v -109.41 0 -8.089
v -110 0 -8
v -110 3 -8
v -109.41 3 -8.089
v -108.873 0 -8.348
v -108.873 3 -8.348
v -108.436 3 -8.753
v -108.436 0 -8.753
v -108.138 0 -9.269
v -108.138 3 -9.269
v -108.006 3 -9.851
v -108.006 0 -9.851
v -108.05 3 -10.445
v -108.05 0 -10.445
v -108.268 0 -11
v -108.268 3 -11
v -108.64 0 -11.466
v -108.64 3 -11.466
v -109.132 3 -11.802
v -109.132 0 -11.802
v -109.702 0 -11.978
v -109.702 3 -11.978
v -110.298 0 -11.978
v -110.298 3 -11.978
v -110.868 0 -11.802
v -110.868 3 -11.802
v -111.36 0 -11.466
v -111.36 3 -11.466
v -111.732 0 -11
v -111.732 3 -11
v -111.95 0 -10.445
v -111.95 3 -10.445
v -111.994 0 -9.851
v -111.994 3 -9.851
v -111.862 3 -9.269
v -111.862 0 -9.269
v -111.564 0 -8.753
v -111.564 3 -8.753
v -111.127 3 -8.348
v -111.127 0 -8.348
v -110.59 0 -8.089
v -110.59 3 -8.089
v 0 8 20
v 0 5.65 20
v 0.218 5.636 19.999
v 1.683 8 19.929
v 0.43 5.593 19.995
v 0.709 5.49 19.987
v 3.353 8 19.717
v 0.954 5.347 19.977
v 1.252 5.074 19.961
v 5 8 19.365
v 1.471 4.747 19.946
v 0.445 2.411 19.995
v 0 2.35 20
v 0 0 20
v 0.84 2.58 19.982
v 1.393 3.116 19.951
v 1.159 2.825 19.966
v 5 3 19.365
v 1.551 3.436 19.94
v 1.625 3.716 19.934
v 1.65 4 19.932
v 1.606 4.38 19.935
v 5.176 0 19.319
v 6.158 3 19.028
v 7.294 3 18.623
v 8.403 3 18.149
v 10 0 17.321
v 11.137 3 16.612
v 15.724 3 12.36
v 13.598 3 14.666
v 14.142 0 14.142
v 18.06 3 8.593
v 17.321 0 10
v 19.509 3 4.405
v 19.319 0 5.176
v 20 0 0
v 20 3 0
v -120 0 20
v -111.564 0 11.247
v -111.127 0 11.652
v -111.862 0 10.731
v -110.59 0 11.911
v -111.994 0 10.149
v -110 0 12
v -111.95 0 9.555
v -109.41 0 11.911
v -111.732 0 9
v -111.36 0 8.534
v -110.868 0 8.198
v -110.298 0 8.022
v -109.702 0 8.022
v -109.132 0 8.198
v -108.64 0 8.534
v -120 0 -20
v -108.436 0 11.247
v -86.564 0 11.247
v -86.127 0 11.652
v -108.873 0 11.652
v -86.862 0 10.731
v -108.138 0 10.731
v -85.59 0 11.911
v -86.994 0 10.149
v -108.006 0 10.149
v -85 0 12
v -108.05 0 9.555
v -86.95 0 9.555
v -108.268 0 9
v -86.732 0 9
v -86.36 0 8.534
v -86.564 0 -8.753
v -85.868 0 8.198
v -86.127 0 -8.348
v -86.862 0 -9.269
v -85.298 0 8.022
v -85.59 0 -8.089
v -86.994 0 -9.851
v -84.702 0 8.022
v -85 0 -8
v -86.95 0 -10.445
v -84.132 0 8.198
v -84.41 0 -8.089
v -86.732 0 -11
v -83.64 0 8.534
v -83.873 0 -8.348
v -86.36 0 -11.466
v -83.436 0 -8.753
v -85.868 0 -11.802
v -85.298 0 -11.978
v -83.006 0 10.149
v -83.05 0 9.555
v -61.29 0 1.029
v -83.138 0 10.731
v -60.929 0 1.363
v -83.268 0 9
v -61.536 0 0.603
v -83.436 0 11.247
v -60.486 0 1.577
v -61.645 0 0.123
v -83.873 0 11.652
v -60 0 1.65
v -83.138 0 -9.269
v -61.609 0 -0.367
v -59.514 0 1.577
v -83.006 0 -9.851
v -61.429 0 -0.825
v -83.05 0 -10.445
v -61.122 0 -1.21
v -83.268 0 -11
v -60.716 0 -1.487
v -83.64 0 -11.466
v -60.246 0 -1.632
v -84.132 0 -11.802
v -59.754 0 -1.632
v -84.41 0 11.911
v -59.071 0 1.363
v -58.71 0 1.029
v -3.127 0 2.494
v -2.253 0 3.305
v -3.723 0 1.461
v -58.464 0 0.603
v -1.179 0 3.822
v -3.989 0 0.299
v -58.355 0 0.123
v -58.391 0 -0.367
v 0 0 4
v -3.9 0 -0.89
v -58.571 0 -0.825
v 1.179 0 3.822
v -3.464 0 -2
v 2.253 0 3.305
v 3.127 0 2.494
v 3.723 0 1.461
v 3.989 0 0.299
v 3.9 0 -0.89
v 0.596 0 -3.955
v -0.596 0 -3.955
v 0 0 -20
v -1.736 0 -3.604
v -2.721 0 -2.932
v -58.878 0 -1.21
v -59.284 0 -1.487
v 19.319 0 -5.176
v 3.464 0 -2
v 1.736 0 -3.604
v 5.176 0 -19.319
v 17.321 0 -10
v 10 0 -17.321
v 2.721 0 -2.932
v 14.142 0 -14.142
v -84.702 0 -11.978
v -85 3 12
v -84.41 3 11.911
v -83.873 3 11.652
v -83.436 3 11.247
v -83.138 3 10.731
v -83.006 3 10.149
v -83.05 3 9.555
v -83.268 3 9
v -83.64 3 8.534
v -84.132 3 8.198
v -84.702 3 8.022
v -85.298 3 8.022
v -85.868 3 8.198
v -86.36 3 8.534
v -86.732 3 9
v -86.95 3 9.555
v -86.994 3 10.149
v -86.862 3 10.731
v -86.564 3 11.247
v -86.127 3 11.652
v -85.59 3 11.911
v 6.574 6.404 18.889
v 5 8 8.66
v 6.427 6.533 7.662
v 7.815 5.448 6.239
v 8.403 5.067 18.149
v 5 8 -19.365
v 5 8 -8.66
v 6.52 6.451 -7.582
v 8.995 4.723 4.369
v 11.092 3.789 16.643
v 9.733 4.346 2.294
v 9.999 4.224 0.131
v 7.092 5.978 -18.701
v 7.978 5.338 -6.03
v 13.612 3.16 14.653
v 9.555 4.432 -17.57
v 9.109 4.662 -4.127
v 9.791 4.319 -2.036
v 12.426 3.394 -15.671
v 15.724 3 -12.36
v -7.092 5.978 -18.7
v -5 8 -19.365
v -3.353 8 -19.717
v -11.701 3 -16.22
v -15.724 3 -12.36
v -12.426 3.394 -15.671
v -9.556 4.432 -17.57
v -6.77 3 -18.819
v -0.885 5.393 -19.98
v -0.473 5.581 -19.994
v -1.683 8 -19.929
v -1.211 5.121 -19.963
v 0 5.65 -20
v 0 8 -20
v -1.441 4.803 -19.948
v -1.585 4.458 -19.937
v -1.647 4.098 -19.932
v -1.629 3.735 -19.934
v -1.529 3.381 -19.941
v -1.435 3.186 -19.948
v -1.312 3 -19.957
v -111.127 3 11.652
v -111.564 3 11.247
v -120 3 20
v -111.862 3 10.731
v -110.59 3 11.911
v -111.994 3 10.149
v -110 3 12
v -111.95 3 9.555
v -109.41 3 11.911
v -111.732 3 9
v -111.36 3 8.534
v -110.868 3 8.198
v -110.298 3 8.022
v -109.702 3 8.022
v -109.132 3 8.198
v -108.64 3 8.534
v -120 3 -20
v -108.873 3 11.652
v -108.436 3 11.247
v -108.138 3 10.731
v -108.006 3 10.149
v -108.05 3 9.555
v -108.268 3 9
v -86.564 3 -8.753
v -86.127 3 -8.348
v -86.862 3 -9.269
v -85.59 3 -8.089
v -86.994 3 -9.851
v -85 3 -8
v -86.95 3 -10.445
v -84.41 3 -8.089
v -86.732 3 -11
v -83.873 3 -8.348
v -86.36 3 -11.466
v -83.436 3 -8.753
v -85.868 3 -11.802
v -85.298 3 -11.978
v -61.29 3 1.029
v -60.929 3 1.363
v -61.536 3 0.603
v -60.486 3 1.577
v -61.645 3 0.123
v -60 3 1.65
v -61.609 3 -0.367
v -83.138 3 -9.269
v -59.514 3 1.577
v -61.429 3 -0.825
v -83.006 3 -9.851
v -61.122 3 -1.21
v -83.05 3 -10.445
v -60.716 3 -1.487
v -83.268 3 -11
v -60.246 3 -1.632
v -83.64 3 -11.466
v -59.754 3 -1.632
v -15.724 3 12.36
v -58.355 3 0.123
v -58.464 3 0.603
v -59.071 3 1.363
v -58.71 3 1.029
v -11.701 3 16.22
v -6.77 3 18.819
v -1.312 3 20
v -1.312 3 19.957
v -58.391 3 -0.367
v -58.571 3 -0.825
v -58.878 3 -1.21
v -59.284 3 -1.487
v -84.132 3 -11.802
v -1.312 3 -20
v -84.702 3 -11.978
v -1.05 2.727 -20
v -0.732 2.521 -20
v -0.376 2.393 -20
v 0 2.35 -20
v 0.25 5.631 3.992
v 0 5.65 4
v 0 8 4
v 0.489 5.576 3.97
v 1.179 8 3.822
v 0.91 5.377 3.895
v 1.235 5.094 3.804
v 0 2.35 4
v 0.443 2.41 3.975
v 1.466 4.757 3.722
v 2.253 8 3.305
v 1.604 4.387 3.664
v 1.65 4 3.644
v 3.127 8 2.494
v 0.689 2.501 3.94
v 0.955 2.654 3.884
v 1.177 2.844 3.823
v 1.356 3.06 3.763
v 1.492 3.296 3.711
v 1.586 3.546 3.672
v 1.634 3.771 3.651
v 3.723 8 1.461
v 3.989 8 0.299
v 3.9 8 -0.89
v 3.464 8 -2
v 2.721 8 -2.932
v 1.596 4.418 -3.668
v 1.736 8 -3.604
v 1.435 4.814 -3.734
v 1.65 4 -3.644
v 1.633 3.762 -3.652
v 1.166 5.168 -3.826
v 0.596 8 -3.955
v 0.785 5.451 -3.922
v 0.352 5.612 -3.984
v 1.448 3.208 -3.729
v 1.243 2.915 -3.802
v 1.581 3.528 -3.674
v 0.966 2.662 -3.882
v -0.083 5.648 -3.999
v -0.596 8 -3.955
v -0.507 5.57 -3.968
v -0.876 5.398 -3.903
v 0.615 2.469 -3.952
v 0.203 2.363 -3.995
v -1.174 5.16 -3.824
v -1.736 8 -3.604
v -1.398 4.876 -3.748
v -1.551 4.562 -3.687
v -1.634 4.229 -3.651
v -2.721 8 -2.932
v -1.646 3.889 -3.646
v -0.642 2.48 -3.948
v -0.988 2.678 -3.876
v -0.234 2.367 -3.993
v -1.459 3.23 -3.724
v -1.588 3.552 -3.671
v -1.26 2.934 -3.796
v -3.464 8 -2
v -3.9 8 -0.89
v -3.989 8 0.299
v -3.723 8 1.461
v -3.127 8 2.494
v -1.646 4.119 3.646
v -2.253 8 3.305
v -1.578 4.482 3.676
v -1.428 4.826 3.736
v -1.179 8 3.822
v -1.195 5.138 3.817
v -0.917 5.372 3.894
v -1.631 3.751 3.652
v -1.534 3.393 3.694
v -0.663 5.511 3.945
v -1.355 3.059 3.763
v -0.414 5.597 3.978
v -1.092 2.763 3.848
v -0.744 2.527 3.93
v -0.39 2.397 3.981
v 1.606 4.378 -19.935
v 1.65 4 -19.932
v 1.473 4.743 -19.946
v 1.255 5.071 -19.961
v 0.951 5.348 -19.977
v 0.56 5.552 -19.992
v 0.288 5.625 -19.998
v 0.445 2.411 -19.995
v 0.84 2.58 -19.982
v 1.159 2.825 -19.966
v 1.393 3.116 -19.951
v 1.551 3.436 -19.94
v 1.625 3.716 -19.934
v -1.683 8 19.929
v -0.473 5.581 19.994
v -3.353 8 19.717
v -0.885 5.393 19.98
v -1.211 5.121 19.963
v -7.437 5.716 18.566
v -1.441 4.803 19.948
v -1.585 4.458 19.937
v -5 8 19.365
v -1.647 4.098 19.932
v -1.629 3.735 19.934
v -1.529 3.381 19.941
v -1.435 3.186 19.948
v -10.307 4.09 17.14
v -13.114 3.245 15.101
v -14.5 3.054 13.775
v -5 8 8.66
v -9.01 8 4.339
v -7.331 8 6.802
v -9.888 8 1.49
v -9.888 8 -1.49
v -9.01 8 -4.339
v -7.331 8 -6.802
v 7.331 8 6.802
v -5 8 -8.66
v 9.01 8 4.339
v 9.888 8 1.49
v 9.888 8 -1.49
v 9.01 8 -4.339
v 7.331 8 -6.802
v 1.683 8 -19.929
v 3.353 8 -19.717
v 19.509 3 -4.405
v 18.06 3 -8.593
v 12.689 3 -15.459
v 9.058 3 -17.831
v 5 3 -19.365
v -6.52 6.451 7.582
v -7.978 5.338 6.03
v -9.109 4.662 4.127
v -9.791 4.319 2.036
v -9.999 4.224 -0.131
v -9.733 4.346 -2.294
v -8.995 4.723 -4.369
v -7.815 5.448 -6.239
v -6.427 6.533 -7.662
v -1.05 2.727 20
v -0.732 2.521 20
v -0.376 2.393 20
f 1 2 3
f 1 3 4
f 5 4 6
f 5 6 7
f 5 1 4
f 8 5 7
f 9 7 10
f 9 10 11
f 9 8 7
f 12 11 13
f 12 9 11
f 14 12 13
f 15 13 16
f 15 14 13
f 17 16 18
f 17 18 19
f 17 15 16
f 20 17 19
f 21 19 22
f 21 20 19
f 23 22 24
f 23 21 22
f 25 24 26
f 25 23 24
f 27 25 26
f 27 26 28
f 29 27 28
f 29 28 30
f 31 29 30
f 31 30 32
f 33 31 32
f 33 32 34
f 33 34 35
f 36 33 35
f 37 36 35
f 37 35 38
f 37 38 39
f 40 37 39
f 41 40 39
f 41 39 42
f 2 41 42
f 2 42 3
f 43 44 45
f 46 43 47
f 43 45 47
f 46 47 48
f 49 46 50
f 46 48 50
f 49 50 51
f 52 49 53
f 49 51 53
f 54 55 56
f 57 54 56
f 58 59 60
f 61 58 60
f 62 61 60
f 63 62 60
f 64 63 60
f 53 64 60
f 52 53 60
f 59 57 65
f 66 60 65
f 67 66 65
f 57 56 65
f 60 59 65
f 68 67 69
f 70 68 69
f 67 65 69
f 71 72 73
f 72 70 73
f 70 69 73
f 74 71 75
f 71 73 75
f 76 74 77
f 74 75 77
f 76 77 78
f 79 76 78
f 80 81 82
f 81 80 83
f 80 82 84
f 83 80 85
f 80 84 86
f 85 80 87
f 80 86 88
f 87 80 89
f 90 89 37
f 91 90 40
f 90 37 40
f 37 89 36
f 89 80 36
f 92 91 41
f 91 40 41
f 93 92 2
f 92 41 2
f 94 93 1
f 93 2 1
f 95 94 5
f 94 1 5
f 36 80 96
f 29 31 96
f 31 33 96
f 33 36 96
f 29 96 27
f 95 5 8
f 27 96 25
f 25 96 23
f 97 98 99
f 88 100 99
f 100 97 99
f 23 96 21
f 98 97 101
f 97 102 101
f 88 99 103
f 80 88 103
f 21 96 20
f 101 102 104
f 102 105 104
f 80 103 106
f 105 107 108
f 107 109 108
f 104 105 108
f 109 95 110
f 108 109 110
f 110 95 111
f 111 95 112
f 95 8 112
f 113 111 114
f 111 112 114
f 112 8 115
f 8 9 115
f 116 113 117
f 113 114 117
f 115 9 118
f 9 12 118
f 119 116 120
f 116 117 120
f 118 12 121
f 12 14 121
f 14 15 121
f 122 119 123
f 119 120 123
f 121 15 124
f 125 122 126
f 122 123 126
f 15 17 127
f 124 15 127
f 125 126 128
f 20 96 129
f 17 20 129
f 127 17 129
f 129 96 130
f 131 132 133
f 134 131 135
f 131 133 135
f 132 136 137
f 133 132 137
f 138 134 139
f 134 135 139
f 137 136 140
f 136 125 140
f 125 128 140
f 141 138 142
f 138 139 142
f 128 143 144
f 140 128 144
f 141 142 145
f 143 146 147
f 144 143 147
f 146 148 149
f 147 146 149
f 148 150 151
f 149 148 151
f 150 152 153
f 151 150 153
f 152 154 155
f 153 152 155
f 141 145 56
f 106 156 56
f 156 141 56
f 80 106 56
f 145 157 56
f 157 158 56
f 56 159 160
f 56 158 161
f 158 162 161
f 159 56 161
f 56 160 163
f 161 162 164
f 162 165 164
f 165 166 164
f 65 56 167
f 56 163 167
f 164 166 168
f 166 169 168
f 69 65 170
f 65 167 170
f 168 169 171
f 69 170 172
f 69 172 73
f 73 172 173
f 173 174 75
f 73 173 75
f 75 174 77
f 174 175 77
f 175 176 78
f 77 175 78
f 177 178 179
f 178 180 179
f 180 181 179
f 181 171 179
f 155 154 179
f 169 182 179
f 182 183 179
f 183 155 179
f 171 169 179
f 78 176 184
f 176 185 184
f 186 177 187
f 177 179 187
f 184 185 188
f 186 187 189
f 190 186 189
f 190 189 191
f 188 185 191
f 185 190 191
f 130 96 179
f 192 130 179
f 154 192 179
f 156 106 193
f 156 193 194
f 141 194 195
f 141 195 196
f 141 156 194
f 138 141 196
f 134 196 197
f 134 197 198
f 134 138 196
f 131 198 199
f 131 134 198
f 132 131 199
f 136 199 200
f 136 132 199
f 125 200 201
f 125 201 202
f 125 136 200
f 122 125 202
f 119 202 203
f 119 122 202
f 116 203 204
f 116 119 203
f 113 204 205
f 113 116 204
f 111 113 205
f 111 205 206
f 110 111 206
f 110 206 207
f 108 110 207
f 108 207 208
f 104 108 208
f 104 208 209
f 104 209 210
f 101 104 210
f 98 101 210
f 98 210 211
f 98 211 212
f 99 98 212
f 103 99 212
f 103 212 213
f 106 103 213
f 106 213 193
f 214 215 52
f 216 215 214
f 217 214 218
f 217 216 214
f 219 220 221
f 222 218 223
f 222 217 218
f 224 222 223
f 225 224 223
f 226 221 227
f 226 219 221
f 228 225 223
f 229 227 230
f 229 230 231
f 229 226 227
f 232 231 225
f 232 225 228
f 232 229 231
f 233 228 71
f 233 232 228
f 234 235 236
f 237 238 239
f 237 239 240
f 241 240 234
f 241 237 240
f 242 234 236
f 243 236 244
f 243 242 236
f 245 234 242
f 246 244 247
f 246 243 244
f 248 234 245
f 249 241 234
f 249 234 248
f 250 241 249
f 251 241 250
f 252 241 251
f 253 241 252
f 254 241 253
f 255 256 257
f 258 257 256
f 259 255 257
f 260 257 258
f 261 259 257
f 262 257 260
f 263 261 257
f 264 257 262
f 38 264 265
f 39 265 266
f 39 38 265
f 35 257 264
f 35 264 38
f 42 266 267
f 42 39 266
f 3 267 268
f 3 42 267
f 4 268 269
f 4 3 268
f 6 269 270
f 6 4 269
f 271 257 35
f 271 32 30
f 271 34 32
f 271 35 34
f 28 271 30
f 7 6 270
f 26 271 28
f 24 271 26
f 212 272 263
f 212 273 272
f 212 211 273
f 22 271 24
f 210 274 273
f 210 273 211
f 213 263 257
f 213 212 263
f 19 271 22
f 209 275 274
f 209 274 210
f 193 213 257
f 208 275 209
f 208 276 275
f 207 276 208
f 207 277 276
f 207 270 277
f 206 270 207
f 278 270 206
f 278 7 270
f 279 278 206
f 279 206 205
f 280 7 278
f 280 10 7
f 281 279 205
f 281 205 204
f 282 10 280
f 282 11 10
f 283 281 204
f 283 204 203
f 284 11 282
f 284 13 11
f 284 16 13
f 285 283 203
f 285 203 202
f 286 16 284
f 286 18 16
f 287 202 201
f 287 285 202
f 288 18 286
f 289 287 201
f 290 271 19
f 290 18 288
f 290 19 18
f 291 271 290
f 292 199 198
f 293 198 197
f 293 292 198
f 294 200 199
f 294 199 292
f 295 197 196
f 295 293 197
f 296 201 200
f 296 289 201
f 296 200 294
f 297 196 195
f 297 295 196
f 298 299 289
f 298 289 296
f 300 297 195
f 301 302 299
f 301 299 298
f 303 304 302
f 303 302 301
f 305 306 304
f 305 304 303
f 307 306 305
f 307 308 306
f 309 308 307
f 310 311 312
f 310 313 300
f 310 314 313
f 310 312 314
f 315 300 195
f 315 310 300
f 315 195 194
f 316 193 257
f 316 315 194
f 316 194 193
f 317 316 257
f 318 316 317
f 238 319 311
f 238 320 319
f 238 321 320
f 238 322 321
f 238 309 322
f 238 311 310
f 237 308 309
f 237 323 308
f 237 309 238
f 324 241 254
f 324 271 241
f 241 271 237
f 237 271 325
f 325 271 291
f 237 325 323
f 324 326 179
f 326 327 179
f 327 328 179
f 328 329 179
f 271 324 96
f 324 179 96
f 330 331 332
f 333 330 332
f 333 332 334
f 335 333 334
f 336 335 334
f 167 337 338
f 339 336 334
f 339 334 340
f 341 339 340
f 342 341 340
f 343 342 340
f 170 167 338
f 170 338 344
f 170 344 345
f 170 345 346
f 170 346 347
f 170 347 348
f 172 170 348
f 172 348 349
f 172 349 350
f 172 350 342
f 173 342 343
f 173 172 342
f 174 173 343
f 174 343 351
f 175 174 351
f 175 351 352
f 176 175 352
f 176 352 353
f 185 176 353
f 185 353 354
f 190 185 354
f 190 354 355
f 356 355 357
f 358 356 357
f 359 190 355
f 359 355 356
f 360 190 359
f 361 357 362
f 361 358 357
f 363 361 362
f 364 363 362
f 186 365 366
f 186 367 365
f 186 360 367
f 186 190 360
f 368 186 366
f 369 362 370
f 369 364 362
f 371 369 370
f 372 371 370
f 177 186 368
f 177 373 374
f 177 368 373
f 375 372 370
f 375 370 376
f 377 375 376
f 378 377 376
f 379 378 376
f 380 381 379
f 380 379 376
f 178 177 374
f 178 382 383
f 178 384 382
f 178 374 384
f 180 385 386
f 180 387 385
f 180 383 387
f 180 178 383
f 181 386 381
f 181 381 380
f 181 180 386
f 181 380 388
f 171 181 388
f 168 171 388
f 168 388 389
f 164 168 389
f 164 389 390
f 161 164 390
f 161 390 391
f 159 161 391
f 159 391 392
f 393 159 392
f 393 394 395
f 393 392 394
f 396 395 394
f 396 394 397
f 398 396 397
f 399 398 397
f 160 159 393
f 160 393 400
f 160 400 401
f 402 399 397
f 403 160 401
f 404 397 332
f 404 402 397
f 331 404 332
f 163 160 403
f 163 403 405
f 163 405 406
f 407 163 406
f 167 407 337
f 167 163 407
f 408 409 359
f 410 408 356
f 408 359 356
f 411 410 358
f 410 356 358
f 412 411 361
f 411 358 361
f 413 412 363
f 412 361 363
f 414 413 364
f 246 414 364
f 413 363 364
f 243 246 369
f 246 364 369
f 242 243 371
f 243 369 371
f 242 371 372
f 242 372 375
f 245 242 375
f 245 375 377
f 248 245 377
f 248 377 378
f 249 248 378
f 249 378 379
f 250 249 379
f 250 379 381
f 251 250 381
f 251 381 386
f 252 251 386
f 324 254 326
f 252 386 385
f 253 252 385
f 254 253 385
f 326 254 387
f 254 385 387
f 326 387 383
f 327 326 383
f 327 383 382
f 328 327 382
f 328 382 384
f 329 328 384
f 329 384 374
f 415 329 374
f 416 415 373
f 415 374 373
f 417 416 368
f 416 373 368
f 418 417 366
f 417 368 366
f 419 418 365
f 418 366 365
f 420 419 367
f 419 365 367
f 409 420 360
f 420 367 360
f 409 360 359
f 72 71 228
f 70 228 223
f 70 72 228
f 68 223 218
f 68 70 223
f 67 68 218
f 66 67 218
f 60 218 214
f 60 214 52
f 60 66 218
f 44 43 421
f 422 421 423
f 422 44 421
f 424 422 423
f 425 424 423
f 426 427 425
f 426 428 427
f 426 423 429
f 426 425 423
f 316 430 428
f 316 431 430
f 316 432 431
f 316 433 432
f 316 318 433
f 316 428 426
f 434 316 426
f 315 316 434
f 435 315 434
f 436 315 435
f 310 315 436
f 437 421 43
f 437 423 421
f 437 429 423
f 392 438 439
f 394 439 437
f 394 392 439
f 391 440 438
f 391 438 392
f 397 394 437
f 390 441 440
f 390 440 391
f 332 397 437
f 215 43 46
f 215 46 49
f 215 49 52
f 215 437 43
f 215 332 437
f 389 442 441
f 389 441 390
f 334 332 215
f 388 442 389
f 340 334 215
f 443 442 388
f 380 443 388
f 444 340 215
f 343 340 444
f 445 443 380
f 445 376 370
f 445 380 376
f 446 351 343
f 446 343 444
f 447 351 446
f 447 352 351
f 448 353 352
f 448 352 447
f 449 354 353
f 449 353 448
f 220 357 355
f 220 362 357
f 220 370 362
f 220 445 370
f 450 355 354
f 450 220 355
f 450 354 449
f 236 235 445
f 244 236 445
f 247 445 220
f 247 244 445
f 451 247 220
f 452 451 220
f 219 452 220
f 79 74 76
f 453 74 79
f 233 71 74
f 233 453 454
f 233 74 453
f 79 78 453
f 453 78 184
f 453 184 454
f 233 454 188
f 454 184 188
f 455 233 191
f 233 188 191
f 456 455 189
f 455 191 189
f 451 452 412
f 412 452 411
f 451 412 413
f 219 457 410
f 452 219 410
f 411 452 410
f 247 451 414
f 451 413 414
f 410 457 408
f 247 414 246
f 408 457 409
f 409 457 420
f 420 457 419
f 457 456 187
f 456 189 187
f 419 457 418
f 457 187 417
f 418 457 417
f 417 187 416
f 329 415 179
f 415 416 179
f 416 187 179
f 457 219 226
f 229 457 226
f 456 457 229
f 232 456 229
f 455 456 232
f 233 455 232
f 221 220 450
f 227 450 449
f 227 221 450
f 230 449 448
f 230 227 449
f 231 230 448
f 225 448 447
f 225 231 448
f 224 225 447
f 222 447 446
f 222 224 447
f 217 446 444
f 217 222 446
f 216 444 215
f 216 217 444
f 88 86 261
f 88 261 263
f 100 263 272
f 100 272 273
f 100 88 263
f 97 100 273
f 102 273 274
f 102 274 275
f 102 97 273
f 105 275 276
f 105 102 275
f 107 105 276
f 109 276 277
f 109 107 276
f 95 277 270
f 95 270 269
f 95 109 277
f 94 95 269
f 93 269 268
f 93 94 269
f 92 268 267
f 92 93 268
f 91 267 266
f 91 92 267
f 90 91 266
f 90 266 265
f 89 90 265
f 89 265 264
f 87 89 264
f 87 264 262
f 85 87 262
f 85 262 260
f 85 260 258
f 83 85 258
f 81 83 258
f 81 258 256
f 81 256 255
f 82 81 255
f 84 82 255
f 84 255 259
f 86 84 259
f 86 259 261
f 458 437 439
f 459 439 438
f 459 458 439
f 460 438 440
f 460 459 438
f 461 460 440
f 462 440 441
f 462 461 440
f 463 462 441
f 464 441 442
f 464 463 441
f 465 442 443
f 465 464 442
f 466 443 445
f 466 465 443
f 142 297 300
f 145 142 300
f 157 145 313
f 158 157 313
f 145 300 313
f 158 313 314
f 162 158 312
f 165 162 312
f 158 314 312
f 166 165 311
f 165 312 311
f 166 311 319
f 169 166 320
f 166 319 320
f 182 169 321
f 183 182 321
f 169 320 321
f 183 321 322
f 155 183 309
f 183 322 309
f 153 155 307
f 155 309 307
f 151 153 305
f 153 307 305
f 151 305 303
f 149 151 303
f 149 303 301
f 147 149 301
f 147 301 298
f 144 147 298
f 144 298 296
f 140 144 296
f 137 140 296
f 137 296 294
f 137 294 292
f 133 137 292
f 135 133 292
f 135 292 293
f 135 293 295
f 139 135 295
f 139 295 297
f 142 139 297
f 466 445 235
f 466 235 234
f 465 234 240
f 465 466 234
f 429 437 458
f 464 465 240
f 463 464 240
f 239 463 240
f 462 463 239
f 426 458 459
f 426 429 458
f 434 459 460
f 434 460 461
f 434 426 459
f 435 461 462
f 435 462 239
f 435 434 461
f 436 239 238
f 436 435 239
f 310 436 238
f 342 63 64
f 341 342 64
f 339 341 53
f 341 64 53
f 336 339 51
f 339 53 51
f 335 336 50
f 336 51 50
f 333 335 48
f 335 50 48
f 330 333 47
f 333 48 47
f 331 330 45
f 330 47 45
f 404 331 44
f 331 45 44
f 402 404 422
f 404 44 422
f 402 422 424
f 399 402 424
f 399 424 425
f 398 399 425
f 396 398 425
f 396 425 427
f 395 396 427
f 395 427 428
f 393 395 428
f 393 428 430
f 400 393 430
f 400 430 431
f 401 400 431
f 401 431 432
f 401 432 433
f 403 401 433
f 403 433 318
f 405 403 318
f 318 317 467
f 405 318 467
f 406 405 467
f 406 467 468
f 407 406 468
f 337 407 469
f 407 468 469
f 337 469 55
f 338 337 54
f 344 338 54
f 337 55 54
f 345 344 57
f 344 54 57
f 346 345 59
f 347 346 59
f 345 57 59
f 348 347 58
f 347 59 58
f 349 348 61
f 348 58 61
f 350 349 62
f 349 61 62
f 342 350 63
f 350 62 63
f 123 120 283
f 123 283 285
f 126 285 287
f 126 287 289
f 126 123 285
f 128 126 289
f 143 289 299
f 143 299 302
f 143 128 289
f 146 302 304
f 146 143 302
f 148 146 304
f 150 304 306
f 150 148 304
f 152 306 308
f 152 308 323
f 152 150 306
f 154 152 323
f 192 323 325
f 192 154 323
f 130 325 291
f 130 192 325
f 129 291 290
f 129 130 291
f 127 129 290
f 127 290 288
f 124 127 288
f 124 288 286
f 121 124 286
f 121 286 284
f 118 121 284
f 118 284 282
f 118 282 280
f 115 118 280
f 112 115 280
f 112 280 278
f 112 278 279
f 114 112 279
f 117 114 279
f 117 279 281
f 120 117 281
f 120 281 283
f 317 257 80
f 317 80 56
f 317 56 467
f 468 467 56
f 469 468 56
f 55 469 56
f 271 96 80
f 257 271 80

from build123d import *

# Parameters (mm, degrees)
SKETCH1_R           = 2
SKETCH1_R_2         = 4
BOSS_EXTRUDE1_DEPTH = 8
CUT_EXTRUDE1_START  = -5
SKETCH4_R           = 2
CUT_EXTRUDE1_DEPTH  = 5
FILLET2_R           = 14
M4_TAPPED_HOLE1_D   = 3.3
SKETCH5_R           = 1.65
CUT_EXTRUDE2_DEPTH  = 122.757956639
CUT_EXTRUDE3_START  = -5
CUT_EXTRUDE3_DEPTH  = 5


with BuildPart() as part:
    # Sketch1 → Boss-Extrude1 (new body)
    with BuildSketch(Plane(origin=(0, 0, 0), x_dir=(1, 0, 0), z_dir=(0, 1, 0))):
        with BuildLine():
            Line((0, 20), (-120, 20))
            Line((-120, 20), (-120, -5))
            Line((-120, -5), (-120, -20))
            Line((-120, -20), (0, -20))
            ThreePointArc((0, -20), (14.142135607, -14.14213564), (20, -4.7e-08))
            ThreePointArc((20, -4.7e-08), (14.14213564, 14.142135607), (0, 20))
        make_face()
        with Locations(Location((-110, -10, 0), (0, 0, 270))):
            Circle(SKETCH1_R, mode=Mode.SUBTRACT)
        with Locations(Location((-85, -10, 0), (0, 0, 270))):
            Circle(SKETCH1_R, mode=Mode.SUBTRACT)
        with Locations(Location((-110, 10, 0), (0, 0, 270))):
            Circle(SKETCH1_R, mode=Mode.SUBTRACT)
        with Locations(Location((-85, 10, 0), (0, 0, 270))):
            Circle(SKETCH1_R, mode=Mode.SUBTRACT)
        with Locations(Location((0, 0, 0), (0, 0, 270))):
            Circle(SKETCH1_R_2, mode=Mode.SUBTRACT)
    extrude(amount=BOSS_EXTRUDE1_DEPTH)

    # Sketch4 → Cut-Extrude1 (cut)
    # profile 1 of 2: a face of its own
    with BuildSketch(Plane(origin=(0, 8, 0), x_dir=(1, 0, 0), z_dir=(0, 1, 0)).offset(CUT_EXTRUDE1_START)):
        with BuildLine():
            Line((-5, 8.660254038), (-5, 20))
            Line((-5, 20), (-120, 20))
            Line((-120, 20), (-120, -20))
            Line((-120, -20), (-5, -20))
            Line((-5, -20), (-5, -8.660254038))
            ThreePointArc((-5, -8.660254038), (-10, 0), (-5, 8.660254038))
        make_face()
        with Locations(Location((-110, -10, 0), (0, 0, 270))):
            Circle(SKETCH4_R, mode=Mode.SUBTRACT)
        with Locations(Location((-85, -10, 0), (0, 0, 270))):
            Circle(SKETCH4_R, mode=Mode.SUBTRACT)
        with Locations(Location((-110, 10, 0), (0, 0, 270))):
            Circle(SKETCH4_R, mode=Mode.SUBTRACT)
        with Locations(Location((-85, 10, 0), (0, 0, 270))):
            Circle(SKETCH4_R, mode=Mode.SUBTRACT)
    # profile 2 of 2: a face of its own
    with BuildSketch(Plane(origin=(0, 8, 0), x_dir=(1, 0, 0), z_dir=(0, 1, 0)).offset(CUT_EXTRUDE1_START)):
        with BuildLine():
            ThreePointArc((5, -19.364916731), (20, 0), (5, 19.364916731))
            Line((5, 19.364916731), (5, 8.660254038))
            ThreePointArc((5, 8.660254038), (10, 0), (5, -8.660254038))
            Line((5, -8.660254038), (5, -19.364916731))
        make_face()
    extrude(amount=CUT_EXTRUDE1_DEPTH, mode=Mode.SUBTRACT)

    # Fillet2
    # the kernel refuses this fillet: 14 mm, written as the material it adds along each edge
    with BuildSketch(Plane(origin=(-5, 3, 20), x_dir=(-1, 0, 0), z_dir=(0, 0, -1)), Plane(origin=(-5, 3, 18.149259199), x_dir=(-1, 0, 0), z_dir=(0, 0, -1))) as fillet2_piece_1:
        with BuildLine():
            CenterArc((10.723805295, 14), FILLET2_R, 220.005200885, 49.994799115)
            Line((0, 5), (0, 0))
            Line((0, 0), (10.723805295, 0))
        make_face()
    extrude(amount=38.149259199)
    with BuildSketch(Plane(origin=(5, 3, -46.174429968), x_dir=(0, 1, 0), z_dir=(0, 0, 1))) as fillet2_piece_2_section:
        with BuildLine():
            CenterArc((14, -10.723805295), FILLET2_R, 130.005200885, 49.994799115)
            Line((0, -10.723805295), (0, 0))
            Line((0, 0), (5, 0))
        make_face()
    fillet2_piece_2 = extrude(amount=64.323689167, mode=Mode.PRIVATE)
    fillet2_piece_2 = fillet2_piece_2 & Plane(origin=(0, 3, 0), x_dir=(0, 0, 1), z_dir=(0, -1, 0)) * Cylinder(20, 172, mode=Mode.PRIVATE)
    add(fillet2_piece_2)
    with BuildSketch(Plane(origin=(5, 3, -18.149259199), x_dir=(0, 1, 0), z_dir=(0, 0, 1))) as fillet2_piece_3_section:
        with BuildLine():
            CenterArc((14, -10.723805295), FILLET2_R, 130.005200885, 49.994799115)
            Line((0, -10.723805295), (0, 0))
            Line((0, 0), (5, 0))
        make_face()
    fillet2_piece_3 = extrude(amount=64.323689167, mode=Mode.PRIVATE)
    fillet2_piece_3 = fillet2_piece_3 & Plane(origin=(0, 3, 0), x_dir=(0, 0, 1), z_dir=(0, -1, 0)) * Cylinder(20, 172, mode=Mode.PRIVATE)
    add(fillet2_piece_3)

    # M4 Tapped Hole1 (through all)
    with Locations(Plane(origin=(0, 0, -20), x_dir=(-1, 0, 0), z_dir=(0, 0, -1))):
        with Locations((0, 4)):
            Hole(M4_TAPPED_HOLE1_D / 2)

    # Sketch5 → Cut-Extrude2 (cut, through all)
    with BuildSketch(Plane(origin=(0, 3, 0), x_dir=(1, 0, 0), z_dir=(0, 1, 0))):
        with Locations(Location((-60, 0, 0), (0, 0, 270))):
            Circle(SKETCH5_R)
    extrude(amount=-CUT_EXTRUDE2_DEPTH, mode=Mode.SUBTRACT)

    # Sketch6 → Cut-Extrude3 (cut)
    with BuildSketch(Plane(origin=(0, 8, 0), x_dir=(1, 0, 0), z_dir=(0, 1, 0)).offset(CUT_EXTRUDE3_START)):
        with BuildLine():
            Line((-120, -20), (0, -20))
            ThreePointArc((0, -20), (-20, 0), (0, 20))
            Line((0, 20), (-120, 20))
            Line((-120, 20), (-120, -20))
        make_face()
    extrude(amount=CUT_EXTRUDE3_DEPTH, mode=Mode.SUBTRACT)


solid = part.part
